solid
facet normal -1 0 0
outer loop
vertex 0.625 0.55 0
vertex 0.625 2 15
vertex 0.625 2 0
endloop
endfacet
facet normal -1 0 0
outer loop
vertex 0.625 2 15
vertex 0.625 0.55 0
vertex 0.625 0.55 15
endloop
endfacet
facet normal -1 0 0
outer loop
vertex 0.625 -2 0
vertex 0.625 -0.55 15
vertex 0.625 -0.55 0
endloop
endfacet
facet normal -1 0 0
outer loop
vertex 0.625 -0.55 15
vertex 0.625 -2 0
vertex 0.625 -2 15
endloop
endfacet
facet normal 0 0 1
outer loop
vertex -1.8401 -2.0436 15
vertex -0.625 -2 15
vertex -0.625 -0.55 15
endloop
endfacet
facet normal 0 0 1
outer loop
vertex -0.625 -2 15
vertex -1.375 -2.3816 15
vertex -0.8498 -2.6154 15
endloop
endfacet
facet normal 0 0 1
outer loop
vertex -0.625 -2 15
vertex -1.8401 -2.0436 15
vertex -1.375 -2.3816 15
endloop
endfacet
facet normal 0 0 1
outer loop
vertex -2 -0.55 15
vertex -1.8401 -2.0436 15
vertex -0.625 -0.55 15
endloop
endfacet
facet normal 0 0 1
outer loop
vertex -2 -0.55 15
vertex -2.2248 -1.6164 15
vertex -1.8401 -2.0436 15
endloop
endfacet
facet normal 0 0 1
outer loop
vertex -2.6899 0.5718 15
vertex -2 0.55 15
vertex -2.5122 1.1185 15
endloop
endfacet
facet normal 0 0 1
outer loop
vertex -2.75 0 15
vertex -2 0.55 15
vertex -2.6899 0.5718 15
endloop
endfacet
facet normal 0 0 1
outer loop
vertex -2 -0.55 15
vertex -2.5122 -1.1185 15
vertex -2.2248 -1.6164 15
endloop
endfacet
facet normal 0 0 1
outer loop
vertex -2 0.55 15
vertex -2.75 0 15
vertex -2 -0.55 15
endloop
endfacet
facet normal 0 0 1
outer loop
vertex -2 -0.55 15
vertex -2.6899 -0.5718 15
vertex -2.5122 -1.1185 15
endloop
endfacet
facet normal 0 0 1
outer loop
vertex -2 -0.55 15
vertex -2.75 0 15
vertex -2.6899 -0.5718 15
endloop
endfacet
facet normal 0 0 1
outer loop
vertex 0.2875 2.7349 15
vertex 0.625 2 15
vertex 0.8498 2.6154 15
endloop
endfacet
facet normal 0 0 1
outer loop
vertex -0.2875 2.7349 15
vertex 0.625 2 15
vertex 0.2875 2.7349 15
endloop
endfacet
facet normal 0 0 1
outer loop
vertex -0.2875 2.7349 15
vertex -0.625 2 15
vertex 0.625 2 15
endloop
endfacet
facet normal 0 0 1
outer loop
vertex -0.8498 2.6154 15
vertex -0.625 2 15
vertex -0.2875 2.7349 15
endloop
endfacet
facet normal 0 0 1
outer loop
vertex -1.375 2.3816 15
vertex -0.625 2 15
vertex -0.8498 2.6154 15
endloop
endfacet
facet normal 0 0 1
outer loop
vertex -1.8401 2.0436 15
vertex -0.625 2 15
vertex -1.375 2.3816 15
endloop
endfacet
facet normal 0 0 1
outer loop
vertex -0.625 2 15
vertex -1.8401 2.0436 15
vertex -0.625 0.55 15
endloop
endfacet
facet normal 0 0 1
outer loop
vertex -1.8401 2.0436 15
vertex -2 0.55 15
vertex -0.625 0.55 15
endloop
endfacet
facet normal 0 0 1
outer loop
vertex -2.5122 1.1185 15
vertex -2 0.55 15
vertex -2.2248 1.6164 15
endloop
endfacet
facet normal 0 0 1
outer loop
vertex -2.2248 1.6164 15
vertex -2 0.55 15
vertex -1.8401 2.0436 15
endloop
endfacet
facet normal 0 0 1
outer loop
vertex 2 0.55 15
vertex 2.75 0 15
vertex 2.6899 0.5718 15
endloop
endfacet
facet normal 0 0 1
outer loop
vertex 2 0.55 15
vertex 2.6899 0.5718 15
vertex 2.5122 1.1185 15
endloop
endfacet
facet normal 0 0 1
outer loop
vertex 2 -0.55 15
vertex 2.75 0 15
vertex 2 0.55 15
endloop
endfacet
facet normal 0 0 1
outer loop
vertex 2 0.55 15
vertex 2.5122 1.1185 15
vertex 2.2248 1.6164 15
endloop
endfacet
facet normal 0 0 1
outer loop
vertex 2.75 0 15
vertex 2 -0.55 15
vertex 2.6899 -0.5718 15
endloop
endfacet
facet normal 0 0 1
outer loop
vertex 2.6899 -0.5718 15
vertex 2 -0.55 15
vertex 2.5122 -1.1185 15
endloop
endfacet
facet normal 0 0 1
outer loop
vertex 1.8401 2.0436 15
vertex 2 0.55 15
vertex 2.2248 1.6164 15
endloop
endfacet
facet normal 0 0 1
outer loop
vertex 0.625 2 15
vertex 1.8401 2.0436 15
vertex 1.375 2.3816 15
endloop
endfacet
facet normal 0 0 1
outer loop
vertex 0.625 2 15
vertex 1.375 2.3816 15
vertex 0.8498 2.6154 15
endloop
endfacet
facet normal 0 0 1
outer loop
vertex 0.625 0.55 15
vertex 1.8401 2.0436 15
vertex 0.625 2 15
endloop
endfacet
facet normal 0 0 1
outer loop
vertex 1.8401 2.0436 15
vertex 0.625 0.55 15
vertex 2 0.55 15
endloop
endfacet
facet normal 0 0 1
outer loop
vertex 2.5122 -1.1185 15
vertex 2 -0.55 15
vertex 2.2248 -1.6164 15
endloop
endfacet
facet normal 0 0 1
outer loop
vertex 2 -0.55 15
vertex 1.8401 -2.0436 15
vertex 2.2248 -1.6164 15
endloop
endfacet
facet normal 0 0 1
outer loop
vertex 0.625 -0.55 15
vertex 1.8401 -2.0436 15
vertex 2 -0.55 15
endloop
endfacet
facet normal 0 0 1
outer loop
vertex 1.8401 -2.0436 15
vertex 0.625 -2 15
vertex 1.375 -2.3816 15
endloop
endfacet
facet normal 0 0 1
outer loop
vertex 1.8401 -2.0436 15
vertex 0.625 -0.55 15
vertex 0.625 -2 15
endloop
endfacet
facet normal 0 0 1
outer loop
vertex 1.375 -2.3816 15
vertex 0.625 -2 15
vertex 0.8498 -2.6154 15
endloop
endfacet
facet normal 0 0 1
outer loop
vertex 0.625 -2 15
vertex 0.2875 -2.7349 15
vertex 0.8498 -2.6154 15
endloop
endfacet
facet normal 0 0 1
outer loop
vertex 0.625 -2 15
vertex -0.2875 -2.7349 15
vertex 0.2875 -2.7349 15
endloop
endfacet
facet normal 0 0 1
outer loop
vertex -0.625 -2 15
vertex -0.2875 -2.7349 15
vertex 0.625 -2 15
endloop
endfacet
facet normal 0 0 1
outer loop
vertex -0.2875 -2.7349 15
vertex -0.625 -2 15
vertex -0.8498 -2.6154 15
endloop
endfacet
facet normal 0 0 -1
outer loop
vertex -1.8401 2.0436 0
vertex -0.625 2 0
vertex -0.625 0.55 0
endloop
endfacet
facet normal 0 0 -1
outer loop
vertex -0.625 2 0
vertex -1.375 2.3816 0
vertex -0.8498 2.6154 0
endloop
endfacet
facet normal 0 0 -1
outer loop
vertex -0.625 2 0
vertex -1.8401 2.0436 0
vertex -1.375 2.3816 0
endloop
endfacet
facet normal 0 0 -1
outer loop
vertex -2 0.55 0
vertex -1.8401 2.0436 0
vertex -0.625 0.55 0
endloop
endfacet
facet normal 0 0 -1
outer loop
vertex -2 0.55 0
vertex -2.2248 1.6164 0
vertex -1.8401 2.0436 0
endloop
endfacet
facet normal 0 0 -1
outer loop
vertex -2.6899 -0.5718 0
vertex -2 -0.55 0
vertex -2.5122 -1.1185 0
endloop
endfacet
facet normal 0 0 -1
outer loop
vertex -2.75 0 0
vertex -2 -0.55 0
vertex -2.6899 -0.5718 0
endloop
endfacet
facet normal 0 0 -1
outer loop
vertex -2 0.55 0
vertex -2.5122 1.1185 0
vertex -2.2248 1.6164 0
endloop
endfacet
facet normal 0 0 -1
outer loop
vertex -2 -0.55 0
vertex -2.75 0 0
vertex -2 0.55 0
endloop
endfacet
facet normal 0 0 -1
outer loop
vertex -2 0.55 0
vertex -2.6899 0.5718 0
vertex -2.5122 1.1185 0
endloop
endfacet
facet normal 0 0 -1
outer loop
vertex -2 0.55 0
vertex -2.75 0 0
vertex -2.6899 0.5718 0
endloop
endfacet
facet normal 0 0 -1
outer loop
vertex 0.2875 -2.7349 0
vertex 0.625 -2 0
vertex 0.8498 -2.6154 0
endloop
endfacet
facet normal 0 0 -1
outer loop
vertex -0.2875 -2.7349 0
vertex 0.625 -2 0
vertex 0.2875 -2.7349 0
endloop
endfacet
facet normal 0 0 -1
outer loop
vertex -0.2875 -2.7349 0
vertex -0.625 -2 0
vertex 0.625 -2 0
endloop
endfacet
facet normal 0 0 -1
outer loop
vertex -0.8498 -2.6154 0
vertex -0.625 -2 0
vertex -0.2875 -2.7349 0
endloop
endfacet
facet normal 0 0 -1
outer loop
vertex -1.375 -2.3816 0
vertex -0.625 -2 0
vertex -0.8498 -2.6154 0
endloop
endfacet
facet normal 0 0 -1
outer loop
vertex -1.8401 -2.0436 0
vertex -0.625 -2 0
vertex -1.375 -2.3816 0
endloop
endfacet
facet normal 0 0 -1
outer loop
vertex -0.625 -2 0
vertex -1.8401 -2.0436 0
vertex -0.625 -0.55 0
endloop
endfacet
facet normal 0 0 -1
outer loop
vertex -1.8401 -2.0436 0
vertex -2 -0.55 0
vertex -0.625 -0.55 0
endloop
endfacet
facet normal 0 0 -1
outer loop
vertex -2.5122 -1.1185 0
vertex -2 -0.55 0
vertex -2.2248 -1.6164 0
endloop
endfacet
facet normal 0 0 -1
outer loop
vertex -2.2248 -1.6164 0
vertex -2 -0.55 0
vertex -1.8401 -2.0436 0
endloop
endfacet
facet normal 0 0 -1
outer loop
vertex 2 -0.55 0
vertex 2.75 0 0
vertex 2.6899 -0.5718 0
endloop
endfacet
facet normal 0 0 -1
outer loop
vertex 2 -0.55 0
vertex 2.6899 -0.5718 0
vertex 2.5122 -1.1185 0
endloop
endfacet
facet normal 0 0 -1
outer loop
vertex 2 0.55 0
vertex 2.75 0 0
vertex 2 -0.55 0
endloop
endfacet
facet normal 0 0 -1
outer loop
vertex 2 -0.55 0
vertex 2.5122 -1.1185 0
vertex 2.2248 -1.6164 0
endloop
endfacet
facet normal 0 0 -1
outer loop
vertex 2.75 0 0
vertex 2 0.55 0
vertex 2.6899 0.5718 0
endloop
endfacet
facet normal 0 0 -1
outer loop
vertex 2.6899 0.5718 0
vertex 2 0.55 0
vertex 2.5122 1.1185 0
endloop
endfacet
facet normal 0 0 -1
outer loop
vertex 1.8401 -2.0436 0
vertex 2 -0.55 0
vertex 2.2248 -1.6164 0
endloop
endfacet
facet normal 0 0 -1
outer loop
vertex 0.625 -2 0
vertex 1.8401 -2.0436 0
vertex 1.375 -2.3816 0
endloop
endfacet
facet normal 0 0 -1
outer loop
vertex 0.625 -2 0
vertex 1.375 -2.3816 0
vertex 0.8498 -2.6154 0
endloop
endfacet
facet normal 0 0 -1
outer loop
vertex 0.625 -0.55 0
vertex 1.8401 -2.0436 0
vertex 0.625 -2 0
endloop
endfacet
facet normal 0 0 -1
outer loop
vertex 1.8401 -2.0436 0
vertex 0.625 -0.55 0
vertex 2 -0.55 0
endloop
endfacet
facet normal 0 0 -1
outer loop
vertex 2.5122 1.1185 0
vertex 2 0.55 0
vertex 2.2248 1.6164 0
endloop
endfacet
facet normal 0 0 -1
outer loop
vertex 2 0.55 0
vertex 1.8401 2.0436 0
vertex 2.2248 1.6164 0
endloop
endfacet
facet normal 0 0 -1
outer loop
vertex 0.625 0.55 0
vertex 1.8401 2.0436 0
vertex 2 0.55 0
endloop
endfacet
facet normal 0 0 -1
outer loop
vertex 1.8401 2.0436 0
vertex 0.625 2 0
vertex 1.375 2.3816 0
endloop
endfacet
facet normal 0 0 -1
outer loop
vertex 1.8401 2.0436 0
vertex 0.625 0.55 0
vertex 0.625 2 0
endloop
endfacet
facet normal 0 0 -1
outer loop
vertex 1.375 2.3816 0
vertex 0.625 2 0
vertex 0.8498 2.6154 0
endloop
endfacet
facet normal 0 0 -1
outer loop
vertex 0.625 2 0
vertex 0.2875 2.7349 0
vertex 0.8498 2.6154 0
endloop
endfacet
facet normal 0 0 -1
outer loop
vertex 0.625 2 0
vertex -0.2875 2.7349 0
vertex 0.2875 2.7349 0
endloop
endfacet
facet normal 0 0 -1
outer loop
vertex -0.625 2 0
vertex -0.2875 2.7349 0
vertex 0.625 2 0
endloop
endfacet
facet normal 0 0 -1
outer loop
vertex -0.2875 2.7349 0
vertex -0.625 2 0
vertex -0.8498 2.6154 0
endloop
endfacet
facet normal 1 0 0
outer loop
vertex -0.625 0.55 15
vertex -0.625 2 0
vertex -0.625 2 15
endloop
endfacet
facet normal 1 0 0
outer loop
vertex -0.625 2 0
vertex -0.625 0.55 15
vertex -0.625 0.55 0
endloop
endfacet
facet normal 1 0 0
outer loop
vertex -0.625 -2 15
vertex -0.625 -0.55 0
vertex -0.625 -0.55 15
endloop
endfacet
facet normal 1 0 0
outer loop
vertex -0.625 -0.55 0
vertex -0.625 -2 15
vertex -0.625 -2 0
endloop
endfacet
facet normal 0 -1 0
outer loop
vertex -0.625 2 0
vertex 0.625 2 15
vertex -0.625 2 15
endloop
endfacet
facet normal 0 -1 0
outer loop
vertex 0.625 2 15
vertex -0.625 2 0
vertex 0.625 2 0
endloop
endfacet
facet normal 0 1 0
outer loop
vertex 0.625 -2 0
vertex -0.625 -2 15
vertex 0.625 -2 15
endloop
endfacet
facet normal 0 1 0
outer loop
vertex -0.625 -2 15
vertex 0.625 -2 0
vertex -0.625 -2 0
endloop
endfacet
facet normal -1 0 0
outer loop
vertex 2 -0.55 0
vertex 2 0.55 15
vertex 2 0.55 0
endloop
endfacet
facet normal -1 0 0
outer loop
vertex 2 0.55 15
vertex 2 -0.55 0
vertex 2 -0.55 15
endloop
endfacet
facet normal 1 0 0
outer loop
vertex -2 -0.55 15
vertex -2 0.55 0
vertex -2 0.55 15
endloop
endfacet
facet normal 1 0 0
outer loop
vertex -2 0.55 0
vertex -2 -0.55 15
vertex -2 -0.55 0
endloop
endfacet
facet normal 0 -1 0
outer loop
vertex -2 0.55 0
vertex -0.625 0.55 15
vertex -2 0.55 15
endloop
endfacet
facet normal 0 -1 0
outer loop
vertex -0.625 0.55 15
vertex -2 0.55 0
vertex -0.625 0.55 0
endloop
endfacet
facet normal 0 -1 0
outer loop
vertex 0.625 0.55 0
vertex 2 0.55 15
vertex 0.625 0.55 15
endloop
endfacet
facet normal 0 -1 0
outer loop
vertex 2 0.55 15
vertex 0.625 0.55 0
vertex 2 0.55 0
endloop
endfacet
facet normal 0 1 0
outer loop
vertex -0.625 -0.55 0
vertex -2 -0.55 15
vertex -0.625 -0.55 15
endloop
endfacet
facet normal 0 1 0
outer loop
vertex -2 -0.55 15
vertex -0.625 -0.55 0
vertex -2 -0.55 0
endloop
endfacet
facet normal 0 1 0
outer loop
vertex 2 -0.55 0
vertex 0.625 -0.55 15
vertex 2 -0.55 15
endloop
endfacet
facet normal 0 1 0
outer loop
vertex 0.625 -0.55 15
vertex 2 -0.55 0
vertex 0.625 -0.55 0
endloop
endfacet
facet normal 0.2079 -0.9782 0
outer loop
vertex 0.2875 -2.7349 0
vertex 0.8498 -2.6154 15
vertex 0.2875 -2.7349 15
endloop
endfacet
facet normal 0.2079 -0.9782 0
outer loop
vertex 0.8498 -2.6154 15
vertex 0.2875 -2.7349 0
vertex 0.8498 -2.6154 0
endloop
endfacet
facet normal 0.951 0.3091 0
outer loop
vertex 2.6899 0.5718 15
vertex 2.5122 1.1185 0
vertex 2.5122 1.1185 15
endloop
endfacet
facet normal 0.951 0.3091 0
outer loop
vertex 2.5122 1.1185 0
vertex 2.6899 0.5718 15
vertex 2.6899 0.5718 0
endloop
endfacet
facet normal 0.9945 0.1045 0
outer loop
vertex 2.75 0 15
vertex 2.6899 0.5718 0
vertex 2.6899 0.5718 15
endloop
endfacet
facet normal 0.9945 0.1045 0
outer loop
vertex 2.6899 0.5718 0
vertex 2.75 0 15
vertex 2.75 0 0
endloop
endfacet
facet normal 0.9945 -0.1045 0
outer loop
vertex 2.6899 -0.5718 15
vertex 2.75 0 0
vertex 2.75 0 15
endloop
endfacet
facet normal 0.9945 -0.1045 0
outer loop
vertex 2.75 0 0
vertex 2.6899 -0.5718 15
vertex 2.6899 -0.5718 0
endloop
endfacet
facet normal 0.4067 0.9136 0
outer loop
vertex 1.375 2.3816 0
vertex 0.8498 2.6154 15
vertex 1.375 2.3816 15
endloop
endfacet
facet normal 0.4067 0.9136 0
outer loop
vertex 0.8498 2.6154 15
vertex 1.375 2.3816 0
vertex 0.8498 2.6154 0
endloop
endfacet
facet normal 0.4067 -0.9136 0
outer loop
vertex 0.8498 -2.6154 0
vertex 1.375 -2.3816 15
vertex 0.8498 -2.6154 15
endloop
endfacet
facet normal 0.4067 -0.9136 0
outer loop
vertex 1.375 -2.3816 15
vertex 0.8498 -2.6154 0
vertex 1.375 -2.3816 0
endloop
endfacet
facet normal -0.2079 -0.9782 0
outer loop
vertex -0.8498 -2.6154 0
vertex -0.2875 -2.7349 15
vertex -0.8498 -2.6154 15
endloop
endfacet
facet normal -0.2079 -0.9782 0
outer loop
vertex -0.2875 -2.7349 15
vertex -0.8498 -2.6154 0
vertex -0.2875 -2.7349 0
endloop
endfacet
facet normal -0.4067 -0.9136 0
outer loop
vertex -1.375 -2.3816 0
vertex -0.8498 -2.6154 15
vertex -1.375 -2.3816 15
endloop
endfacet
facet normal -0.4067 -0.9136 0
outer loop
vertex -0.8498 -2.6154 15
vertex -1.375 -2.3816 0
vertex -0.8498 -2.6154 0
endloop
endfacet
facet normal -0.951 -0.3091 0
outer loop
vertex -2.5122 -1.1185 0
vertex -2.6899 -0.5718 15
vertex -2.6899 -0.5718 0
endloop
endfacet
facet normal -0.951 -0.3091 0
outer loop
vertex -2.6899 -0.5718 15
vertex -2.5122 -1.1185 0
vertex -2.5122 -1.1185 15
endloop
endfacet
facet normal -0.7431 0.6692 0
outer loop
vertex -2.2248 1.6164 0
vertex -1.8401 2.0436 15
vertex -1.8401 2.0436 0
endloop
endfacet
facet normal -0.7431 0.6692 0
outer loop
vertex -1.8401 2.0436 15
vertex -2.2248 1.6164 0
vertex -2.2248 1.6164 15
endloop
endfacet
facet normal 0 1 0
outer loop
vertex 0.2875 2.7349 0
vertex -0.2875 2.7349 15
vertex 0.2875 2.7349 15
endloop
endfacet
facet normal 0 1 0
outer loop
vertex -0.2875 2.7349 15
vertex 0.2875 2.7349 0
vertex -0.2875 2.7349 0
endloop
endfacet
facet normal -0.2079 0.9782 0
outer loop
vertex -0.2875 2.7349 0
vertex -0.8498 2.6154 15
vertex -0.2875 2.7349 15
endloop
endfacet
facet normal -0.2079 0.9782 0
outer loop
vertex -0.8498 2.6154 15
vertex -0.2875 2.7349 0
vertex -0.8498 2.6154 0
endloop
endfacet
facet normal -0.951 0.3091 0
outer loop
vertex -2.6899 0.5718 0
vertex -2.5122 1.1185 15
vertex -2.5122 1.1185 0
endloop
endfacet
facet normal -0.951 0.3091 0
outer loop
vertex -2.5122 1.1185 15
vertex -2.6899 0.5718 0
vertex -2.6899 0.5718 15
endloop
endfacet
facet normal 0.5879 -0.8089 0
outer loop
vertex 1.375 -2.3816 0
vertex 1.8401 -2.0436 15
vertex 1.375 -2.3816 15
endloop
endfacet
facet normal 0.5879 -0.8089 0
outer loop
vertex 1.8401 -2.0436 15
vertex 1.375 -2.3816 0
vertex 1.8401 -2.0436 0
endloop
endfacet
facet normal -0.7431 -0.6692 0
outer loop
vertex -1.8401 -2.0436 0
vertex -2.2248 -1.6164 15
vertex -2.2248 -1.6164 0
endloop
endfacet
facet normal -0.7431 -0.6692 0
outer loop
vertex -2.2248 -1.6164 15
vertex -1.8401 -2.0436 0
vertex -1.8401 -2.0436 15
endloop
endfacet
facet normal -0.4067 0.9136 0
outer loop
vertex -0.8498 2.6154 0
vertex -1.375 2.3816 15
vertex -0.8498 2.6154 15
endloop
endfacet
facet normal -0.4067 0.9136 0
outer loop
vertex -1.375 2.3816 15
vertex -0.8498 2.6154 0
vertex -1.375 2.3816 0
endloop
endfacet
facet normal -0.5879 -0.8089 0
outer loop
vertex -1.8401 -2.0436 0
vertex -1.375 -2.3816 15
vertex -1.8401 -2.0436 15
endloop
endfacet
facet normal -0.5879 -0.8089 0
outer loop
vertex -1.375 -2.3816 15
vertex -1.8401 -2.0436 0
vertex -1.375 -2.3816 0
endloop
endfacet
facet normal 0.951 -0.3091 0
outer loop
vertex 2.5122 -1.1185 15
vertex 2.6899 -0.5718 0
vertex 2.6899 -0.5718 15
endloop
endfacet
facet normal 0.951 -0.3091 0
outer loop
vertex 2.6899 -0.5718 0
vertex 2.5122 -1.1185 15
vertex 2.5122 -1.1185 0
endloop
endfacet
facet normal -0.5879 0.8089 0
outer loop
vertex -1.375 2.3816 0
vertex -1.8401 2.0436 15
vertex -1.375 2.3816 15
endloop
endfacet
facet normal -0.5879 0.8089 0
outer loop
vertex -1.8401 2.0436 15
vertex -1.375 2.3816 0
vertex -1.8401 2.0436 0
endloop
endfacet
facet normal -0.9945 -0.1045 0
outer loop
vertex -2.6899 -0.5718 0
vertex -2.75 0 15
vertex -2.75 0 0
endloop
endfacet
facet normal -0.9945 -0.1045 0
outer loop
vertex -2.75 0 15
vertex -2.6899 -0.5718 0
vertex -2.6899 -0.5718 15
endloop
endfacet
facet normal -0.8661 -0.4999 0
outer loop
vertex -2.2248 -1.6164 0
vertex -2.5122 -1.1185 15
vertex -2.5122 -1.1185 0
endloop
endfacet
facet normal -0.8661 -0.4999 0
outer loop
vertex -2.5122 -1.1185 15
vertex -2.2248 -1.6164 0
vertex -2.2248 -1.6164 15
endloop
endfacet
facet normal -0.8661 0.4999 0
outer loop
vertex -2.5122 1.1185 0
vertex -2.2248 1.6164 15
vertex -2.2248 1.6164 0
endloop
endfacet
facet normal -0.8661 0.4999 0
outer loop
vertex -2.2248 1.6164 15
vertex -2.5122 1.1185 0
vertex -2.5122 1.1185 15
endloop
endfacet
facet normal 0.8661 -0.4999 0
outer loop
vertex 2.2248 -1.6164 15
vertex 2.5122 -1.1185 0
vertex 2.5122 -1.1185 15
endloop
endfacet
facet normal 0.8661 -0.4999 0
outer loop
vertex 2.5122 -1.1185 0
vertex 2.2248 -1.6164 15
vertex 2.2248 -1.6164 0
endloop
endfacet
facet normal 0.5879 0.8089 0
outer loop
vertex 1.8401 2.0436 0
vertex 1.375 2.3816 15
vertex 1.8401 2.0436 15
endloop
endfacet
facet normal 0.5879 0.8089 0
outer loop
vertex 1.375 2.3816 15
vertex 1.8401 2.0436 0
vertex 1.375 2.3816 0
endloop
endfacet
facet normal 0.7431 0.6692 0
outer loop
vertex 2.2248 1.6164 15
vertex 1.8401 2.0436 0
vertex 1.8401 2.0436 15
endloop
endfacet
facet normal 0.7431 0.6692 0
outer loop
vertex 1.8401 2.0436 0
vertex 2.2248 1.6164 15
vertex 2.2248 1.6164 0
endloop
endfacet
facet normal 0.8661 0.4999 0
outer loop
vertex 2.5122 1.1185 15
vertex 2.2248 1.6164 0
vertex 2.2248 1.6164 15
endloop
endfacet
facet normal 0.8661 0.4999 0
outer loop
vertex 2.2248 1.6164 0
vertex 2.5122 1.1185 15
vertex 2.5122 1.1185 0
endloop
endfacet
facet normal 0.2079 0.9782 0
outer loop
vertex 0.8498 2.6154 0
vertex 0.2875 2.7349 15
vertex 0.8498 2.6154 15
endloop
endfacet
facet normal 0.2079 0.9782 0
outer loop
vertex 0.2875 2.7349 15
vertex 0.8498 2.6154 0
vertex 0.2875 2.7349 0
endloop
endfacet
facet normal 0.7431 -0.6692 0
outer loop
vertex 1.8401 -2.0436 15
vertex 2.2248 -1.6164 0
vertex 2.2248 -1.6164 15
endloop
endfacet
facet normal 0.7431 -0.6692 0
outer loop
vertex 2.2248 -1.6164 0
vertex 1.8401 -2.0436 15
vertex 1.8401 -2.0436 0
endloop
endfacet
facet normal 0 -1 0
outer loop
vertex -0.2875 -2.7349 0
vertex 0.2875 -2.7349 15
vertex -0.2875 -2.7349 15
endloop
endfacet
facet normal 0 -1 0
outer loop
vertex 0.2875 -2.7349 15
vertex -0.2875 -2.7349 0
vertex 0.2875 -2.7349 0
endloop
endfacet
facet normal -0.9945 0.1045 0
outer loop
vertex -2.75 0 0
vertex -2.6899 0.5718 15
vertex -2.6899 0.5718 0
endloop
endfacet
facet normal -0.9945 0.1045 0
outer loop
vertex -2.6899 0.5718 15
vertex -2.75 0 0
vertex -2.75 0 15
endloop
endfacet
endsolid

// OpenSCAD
$fs=0.01;

module stem_cutout(stem_height) {
    stem_cross_length = 4.0;
    stem_cross_horizontal = 1.25;
    stem_cross_vertical = 1.10;
    
    module horizontal() {
        translate([0,0,stem_height/2])
        cube([stem_cross_horizontal, stem_cross_length,15], center=true);
    }
    
    module vertical () {
        translate([0,0,stem_height/2])
        cube([stem_cross_length, stem_cross_vertical,15], center=true);
    }

    union() {
        horizontal();
        vertical();
    };
}

module stem(stem_height) {
    stem_diameter=5.5;
    difference() {
        cylinder(d=stem_diameter, h=stem_height);
        stem_cutout(stem_height);
    };
}

stem(15);
